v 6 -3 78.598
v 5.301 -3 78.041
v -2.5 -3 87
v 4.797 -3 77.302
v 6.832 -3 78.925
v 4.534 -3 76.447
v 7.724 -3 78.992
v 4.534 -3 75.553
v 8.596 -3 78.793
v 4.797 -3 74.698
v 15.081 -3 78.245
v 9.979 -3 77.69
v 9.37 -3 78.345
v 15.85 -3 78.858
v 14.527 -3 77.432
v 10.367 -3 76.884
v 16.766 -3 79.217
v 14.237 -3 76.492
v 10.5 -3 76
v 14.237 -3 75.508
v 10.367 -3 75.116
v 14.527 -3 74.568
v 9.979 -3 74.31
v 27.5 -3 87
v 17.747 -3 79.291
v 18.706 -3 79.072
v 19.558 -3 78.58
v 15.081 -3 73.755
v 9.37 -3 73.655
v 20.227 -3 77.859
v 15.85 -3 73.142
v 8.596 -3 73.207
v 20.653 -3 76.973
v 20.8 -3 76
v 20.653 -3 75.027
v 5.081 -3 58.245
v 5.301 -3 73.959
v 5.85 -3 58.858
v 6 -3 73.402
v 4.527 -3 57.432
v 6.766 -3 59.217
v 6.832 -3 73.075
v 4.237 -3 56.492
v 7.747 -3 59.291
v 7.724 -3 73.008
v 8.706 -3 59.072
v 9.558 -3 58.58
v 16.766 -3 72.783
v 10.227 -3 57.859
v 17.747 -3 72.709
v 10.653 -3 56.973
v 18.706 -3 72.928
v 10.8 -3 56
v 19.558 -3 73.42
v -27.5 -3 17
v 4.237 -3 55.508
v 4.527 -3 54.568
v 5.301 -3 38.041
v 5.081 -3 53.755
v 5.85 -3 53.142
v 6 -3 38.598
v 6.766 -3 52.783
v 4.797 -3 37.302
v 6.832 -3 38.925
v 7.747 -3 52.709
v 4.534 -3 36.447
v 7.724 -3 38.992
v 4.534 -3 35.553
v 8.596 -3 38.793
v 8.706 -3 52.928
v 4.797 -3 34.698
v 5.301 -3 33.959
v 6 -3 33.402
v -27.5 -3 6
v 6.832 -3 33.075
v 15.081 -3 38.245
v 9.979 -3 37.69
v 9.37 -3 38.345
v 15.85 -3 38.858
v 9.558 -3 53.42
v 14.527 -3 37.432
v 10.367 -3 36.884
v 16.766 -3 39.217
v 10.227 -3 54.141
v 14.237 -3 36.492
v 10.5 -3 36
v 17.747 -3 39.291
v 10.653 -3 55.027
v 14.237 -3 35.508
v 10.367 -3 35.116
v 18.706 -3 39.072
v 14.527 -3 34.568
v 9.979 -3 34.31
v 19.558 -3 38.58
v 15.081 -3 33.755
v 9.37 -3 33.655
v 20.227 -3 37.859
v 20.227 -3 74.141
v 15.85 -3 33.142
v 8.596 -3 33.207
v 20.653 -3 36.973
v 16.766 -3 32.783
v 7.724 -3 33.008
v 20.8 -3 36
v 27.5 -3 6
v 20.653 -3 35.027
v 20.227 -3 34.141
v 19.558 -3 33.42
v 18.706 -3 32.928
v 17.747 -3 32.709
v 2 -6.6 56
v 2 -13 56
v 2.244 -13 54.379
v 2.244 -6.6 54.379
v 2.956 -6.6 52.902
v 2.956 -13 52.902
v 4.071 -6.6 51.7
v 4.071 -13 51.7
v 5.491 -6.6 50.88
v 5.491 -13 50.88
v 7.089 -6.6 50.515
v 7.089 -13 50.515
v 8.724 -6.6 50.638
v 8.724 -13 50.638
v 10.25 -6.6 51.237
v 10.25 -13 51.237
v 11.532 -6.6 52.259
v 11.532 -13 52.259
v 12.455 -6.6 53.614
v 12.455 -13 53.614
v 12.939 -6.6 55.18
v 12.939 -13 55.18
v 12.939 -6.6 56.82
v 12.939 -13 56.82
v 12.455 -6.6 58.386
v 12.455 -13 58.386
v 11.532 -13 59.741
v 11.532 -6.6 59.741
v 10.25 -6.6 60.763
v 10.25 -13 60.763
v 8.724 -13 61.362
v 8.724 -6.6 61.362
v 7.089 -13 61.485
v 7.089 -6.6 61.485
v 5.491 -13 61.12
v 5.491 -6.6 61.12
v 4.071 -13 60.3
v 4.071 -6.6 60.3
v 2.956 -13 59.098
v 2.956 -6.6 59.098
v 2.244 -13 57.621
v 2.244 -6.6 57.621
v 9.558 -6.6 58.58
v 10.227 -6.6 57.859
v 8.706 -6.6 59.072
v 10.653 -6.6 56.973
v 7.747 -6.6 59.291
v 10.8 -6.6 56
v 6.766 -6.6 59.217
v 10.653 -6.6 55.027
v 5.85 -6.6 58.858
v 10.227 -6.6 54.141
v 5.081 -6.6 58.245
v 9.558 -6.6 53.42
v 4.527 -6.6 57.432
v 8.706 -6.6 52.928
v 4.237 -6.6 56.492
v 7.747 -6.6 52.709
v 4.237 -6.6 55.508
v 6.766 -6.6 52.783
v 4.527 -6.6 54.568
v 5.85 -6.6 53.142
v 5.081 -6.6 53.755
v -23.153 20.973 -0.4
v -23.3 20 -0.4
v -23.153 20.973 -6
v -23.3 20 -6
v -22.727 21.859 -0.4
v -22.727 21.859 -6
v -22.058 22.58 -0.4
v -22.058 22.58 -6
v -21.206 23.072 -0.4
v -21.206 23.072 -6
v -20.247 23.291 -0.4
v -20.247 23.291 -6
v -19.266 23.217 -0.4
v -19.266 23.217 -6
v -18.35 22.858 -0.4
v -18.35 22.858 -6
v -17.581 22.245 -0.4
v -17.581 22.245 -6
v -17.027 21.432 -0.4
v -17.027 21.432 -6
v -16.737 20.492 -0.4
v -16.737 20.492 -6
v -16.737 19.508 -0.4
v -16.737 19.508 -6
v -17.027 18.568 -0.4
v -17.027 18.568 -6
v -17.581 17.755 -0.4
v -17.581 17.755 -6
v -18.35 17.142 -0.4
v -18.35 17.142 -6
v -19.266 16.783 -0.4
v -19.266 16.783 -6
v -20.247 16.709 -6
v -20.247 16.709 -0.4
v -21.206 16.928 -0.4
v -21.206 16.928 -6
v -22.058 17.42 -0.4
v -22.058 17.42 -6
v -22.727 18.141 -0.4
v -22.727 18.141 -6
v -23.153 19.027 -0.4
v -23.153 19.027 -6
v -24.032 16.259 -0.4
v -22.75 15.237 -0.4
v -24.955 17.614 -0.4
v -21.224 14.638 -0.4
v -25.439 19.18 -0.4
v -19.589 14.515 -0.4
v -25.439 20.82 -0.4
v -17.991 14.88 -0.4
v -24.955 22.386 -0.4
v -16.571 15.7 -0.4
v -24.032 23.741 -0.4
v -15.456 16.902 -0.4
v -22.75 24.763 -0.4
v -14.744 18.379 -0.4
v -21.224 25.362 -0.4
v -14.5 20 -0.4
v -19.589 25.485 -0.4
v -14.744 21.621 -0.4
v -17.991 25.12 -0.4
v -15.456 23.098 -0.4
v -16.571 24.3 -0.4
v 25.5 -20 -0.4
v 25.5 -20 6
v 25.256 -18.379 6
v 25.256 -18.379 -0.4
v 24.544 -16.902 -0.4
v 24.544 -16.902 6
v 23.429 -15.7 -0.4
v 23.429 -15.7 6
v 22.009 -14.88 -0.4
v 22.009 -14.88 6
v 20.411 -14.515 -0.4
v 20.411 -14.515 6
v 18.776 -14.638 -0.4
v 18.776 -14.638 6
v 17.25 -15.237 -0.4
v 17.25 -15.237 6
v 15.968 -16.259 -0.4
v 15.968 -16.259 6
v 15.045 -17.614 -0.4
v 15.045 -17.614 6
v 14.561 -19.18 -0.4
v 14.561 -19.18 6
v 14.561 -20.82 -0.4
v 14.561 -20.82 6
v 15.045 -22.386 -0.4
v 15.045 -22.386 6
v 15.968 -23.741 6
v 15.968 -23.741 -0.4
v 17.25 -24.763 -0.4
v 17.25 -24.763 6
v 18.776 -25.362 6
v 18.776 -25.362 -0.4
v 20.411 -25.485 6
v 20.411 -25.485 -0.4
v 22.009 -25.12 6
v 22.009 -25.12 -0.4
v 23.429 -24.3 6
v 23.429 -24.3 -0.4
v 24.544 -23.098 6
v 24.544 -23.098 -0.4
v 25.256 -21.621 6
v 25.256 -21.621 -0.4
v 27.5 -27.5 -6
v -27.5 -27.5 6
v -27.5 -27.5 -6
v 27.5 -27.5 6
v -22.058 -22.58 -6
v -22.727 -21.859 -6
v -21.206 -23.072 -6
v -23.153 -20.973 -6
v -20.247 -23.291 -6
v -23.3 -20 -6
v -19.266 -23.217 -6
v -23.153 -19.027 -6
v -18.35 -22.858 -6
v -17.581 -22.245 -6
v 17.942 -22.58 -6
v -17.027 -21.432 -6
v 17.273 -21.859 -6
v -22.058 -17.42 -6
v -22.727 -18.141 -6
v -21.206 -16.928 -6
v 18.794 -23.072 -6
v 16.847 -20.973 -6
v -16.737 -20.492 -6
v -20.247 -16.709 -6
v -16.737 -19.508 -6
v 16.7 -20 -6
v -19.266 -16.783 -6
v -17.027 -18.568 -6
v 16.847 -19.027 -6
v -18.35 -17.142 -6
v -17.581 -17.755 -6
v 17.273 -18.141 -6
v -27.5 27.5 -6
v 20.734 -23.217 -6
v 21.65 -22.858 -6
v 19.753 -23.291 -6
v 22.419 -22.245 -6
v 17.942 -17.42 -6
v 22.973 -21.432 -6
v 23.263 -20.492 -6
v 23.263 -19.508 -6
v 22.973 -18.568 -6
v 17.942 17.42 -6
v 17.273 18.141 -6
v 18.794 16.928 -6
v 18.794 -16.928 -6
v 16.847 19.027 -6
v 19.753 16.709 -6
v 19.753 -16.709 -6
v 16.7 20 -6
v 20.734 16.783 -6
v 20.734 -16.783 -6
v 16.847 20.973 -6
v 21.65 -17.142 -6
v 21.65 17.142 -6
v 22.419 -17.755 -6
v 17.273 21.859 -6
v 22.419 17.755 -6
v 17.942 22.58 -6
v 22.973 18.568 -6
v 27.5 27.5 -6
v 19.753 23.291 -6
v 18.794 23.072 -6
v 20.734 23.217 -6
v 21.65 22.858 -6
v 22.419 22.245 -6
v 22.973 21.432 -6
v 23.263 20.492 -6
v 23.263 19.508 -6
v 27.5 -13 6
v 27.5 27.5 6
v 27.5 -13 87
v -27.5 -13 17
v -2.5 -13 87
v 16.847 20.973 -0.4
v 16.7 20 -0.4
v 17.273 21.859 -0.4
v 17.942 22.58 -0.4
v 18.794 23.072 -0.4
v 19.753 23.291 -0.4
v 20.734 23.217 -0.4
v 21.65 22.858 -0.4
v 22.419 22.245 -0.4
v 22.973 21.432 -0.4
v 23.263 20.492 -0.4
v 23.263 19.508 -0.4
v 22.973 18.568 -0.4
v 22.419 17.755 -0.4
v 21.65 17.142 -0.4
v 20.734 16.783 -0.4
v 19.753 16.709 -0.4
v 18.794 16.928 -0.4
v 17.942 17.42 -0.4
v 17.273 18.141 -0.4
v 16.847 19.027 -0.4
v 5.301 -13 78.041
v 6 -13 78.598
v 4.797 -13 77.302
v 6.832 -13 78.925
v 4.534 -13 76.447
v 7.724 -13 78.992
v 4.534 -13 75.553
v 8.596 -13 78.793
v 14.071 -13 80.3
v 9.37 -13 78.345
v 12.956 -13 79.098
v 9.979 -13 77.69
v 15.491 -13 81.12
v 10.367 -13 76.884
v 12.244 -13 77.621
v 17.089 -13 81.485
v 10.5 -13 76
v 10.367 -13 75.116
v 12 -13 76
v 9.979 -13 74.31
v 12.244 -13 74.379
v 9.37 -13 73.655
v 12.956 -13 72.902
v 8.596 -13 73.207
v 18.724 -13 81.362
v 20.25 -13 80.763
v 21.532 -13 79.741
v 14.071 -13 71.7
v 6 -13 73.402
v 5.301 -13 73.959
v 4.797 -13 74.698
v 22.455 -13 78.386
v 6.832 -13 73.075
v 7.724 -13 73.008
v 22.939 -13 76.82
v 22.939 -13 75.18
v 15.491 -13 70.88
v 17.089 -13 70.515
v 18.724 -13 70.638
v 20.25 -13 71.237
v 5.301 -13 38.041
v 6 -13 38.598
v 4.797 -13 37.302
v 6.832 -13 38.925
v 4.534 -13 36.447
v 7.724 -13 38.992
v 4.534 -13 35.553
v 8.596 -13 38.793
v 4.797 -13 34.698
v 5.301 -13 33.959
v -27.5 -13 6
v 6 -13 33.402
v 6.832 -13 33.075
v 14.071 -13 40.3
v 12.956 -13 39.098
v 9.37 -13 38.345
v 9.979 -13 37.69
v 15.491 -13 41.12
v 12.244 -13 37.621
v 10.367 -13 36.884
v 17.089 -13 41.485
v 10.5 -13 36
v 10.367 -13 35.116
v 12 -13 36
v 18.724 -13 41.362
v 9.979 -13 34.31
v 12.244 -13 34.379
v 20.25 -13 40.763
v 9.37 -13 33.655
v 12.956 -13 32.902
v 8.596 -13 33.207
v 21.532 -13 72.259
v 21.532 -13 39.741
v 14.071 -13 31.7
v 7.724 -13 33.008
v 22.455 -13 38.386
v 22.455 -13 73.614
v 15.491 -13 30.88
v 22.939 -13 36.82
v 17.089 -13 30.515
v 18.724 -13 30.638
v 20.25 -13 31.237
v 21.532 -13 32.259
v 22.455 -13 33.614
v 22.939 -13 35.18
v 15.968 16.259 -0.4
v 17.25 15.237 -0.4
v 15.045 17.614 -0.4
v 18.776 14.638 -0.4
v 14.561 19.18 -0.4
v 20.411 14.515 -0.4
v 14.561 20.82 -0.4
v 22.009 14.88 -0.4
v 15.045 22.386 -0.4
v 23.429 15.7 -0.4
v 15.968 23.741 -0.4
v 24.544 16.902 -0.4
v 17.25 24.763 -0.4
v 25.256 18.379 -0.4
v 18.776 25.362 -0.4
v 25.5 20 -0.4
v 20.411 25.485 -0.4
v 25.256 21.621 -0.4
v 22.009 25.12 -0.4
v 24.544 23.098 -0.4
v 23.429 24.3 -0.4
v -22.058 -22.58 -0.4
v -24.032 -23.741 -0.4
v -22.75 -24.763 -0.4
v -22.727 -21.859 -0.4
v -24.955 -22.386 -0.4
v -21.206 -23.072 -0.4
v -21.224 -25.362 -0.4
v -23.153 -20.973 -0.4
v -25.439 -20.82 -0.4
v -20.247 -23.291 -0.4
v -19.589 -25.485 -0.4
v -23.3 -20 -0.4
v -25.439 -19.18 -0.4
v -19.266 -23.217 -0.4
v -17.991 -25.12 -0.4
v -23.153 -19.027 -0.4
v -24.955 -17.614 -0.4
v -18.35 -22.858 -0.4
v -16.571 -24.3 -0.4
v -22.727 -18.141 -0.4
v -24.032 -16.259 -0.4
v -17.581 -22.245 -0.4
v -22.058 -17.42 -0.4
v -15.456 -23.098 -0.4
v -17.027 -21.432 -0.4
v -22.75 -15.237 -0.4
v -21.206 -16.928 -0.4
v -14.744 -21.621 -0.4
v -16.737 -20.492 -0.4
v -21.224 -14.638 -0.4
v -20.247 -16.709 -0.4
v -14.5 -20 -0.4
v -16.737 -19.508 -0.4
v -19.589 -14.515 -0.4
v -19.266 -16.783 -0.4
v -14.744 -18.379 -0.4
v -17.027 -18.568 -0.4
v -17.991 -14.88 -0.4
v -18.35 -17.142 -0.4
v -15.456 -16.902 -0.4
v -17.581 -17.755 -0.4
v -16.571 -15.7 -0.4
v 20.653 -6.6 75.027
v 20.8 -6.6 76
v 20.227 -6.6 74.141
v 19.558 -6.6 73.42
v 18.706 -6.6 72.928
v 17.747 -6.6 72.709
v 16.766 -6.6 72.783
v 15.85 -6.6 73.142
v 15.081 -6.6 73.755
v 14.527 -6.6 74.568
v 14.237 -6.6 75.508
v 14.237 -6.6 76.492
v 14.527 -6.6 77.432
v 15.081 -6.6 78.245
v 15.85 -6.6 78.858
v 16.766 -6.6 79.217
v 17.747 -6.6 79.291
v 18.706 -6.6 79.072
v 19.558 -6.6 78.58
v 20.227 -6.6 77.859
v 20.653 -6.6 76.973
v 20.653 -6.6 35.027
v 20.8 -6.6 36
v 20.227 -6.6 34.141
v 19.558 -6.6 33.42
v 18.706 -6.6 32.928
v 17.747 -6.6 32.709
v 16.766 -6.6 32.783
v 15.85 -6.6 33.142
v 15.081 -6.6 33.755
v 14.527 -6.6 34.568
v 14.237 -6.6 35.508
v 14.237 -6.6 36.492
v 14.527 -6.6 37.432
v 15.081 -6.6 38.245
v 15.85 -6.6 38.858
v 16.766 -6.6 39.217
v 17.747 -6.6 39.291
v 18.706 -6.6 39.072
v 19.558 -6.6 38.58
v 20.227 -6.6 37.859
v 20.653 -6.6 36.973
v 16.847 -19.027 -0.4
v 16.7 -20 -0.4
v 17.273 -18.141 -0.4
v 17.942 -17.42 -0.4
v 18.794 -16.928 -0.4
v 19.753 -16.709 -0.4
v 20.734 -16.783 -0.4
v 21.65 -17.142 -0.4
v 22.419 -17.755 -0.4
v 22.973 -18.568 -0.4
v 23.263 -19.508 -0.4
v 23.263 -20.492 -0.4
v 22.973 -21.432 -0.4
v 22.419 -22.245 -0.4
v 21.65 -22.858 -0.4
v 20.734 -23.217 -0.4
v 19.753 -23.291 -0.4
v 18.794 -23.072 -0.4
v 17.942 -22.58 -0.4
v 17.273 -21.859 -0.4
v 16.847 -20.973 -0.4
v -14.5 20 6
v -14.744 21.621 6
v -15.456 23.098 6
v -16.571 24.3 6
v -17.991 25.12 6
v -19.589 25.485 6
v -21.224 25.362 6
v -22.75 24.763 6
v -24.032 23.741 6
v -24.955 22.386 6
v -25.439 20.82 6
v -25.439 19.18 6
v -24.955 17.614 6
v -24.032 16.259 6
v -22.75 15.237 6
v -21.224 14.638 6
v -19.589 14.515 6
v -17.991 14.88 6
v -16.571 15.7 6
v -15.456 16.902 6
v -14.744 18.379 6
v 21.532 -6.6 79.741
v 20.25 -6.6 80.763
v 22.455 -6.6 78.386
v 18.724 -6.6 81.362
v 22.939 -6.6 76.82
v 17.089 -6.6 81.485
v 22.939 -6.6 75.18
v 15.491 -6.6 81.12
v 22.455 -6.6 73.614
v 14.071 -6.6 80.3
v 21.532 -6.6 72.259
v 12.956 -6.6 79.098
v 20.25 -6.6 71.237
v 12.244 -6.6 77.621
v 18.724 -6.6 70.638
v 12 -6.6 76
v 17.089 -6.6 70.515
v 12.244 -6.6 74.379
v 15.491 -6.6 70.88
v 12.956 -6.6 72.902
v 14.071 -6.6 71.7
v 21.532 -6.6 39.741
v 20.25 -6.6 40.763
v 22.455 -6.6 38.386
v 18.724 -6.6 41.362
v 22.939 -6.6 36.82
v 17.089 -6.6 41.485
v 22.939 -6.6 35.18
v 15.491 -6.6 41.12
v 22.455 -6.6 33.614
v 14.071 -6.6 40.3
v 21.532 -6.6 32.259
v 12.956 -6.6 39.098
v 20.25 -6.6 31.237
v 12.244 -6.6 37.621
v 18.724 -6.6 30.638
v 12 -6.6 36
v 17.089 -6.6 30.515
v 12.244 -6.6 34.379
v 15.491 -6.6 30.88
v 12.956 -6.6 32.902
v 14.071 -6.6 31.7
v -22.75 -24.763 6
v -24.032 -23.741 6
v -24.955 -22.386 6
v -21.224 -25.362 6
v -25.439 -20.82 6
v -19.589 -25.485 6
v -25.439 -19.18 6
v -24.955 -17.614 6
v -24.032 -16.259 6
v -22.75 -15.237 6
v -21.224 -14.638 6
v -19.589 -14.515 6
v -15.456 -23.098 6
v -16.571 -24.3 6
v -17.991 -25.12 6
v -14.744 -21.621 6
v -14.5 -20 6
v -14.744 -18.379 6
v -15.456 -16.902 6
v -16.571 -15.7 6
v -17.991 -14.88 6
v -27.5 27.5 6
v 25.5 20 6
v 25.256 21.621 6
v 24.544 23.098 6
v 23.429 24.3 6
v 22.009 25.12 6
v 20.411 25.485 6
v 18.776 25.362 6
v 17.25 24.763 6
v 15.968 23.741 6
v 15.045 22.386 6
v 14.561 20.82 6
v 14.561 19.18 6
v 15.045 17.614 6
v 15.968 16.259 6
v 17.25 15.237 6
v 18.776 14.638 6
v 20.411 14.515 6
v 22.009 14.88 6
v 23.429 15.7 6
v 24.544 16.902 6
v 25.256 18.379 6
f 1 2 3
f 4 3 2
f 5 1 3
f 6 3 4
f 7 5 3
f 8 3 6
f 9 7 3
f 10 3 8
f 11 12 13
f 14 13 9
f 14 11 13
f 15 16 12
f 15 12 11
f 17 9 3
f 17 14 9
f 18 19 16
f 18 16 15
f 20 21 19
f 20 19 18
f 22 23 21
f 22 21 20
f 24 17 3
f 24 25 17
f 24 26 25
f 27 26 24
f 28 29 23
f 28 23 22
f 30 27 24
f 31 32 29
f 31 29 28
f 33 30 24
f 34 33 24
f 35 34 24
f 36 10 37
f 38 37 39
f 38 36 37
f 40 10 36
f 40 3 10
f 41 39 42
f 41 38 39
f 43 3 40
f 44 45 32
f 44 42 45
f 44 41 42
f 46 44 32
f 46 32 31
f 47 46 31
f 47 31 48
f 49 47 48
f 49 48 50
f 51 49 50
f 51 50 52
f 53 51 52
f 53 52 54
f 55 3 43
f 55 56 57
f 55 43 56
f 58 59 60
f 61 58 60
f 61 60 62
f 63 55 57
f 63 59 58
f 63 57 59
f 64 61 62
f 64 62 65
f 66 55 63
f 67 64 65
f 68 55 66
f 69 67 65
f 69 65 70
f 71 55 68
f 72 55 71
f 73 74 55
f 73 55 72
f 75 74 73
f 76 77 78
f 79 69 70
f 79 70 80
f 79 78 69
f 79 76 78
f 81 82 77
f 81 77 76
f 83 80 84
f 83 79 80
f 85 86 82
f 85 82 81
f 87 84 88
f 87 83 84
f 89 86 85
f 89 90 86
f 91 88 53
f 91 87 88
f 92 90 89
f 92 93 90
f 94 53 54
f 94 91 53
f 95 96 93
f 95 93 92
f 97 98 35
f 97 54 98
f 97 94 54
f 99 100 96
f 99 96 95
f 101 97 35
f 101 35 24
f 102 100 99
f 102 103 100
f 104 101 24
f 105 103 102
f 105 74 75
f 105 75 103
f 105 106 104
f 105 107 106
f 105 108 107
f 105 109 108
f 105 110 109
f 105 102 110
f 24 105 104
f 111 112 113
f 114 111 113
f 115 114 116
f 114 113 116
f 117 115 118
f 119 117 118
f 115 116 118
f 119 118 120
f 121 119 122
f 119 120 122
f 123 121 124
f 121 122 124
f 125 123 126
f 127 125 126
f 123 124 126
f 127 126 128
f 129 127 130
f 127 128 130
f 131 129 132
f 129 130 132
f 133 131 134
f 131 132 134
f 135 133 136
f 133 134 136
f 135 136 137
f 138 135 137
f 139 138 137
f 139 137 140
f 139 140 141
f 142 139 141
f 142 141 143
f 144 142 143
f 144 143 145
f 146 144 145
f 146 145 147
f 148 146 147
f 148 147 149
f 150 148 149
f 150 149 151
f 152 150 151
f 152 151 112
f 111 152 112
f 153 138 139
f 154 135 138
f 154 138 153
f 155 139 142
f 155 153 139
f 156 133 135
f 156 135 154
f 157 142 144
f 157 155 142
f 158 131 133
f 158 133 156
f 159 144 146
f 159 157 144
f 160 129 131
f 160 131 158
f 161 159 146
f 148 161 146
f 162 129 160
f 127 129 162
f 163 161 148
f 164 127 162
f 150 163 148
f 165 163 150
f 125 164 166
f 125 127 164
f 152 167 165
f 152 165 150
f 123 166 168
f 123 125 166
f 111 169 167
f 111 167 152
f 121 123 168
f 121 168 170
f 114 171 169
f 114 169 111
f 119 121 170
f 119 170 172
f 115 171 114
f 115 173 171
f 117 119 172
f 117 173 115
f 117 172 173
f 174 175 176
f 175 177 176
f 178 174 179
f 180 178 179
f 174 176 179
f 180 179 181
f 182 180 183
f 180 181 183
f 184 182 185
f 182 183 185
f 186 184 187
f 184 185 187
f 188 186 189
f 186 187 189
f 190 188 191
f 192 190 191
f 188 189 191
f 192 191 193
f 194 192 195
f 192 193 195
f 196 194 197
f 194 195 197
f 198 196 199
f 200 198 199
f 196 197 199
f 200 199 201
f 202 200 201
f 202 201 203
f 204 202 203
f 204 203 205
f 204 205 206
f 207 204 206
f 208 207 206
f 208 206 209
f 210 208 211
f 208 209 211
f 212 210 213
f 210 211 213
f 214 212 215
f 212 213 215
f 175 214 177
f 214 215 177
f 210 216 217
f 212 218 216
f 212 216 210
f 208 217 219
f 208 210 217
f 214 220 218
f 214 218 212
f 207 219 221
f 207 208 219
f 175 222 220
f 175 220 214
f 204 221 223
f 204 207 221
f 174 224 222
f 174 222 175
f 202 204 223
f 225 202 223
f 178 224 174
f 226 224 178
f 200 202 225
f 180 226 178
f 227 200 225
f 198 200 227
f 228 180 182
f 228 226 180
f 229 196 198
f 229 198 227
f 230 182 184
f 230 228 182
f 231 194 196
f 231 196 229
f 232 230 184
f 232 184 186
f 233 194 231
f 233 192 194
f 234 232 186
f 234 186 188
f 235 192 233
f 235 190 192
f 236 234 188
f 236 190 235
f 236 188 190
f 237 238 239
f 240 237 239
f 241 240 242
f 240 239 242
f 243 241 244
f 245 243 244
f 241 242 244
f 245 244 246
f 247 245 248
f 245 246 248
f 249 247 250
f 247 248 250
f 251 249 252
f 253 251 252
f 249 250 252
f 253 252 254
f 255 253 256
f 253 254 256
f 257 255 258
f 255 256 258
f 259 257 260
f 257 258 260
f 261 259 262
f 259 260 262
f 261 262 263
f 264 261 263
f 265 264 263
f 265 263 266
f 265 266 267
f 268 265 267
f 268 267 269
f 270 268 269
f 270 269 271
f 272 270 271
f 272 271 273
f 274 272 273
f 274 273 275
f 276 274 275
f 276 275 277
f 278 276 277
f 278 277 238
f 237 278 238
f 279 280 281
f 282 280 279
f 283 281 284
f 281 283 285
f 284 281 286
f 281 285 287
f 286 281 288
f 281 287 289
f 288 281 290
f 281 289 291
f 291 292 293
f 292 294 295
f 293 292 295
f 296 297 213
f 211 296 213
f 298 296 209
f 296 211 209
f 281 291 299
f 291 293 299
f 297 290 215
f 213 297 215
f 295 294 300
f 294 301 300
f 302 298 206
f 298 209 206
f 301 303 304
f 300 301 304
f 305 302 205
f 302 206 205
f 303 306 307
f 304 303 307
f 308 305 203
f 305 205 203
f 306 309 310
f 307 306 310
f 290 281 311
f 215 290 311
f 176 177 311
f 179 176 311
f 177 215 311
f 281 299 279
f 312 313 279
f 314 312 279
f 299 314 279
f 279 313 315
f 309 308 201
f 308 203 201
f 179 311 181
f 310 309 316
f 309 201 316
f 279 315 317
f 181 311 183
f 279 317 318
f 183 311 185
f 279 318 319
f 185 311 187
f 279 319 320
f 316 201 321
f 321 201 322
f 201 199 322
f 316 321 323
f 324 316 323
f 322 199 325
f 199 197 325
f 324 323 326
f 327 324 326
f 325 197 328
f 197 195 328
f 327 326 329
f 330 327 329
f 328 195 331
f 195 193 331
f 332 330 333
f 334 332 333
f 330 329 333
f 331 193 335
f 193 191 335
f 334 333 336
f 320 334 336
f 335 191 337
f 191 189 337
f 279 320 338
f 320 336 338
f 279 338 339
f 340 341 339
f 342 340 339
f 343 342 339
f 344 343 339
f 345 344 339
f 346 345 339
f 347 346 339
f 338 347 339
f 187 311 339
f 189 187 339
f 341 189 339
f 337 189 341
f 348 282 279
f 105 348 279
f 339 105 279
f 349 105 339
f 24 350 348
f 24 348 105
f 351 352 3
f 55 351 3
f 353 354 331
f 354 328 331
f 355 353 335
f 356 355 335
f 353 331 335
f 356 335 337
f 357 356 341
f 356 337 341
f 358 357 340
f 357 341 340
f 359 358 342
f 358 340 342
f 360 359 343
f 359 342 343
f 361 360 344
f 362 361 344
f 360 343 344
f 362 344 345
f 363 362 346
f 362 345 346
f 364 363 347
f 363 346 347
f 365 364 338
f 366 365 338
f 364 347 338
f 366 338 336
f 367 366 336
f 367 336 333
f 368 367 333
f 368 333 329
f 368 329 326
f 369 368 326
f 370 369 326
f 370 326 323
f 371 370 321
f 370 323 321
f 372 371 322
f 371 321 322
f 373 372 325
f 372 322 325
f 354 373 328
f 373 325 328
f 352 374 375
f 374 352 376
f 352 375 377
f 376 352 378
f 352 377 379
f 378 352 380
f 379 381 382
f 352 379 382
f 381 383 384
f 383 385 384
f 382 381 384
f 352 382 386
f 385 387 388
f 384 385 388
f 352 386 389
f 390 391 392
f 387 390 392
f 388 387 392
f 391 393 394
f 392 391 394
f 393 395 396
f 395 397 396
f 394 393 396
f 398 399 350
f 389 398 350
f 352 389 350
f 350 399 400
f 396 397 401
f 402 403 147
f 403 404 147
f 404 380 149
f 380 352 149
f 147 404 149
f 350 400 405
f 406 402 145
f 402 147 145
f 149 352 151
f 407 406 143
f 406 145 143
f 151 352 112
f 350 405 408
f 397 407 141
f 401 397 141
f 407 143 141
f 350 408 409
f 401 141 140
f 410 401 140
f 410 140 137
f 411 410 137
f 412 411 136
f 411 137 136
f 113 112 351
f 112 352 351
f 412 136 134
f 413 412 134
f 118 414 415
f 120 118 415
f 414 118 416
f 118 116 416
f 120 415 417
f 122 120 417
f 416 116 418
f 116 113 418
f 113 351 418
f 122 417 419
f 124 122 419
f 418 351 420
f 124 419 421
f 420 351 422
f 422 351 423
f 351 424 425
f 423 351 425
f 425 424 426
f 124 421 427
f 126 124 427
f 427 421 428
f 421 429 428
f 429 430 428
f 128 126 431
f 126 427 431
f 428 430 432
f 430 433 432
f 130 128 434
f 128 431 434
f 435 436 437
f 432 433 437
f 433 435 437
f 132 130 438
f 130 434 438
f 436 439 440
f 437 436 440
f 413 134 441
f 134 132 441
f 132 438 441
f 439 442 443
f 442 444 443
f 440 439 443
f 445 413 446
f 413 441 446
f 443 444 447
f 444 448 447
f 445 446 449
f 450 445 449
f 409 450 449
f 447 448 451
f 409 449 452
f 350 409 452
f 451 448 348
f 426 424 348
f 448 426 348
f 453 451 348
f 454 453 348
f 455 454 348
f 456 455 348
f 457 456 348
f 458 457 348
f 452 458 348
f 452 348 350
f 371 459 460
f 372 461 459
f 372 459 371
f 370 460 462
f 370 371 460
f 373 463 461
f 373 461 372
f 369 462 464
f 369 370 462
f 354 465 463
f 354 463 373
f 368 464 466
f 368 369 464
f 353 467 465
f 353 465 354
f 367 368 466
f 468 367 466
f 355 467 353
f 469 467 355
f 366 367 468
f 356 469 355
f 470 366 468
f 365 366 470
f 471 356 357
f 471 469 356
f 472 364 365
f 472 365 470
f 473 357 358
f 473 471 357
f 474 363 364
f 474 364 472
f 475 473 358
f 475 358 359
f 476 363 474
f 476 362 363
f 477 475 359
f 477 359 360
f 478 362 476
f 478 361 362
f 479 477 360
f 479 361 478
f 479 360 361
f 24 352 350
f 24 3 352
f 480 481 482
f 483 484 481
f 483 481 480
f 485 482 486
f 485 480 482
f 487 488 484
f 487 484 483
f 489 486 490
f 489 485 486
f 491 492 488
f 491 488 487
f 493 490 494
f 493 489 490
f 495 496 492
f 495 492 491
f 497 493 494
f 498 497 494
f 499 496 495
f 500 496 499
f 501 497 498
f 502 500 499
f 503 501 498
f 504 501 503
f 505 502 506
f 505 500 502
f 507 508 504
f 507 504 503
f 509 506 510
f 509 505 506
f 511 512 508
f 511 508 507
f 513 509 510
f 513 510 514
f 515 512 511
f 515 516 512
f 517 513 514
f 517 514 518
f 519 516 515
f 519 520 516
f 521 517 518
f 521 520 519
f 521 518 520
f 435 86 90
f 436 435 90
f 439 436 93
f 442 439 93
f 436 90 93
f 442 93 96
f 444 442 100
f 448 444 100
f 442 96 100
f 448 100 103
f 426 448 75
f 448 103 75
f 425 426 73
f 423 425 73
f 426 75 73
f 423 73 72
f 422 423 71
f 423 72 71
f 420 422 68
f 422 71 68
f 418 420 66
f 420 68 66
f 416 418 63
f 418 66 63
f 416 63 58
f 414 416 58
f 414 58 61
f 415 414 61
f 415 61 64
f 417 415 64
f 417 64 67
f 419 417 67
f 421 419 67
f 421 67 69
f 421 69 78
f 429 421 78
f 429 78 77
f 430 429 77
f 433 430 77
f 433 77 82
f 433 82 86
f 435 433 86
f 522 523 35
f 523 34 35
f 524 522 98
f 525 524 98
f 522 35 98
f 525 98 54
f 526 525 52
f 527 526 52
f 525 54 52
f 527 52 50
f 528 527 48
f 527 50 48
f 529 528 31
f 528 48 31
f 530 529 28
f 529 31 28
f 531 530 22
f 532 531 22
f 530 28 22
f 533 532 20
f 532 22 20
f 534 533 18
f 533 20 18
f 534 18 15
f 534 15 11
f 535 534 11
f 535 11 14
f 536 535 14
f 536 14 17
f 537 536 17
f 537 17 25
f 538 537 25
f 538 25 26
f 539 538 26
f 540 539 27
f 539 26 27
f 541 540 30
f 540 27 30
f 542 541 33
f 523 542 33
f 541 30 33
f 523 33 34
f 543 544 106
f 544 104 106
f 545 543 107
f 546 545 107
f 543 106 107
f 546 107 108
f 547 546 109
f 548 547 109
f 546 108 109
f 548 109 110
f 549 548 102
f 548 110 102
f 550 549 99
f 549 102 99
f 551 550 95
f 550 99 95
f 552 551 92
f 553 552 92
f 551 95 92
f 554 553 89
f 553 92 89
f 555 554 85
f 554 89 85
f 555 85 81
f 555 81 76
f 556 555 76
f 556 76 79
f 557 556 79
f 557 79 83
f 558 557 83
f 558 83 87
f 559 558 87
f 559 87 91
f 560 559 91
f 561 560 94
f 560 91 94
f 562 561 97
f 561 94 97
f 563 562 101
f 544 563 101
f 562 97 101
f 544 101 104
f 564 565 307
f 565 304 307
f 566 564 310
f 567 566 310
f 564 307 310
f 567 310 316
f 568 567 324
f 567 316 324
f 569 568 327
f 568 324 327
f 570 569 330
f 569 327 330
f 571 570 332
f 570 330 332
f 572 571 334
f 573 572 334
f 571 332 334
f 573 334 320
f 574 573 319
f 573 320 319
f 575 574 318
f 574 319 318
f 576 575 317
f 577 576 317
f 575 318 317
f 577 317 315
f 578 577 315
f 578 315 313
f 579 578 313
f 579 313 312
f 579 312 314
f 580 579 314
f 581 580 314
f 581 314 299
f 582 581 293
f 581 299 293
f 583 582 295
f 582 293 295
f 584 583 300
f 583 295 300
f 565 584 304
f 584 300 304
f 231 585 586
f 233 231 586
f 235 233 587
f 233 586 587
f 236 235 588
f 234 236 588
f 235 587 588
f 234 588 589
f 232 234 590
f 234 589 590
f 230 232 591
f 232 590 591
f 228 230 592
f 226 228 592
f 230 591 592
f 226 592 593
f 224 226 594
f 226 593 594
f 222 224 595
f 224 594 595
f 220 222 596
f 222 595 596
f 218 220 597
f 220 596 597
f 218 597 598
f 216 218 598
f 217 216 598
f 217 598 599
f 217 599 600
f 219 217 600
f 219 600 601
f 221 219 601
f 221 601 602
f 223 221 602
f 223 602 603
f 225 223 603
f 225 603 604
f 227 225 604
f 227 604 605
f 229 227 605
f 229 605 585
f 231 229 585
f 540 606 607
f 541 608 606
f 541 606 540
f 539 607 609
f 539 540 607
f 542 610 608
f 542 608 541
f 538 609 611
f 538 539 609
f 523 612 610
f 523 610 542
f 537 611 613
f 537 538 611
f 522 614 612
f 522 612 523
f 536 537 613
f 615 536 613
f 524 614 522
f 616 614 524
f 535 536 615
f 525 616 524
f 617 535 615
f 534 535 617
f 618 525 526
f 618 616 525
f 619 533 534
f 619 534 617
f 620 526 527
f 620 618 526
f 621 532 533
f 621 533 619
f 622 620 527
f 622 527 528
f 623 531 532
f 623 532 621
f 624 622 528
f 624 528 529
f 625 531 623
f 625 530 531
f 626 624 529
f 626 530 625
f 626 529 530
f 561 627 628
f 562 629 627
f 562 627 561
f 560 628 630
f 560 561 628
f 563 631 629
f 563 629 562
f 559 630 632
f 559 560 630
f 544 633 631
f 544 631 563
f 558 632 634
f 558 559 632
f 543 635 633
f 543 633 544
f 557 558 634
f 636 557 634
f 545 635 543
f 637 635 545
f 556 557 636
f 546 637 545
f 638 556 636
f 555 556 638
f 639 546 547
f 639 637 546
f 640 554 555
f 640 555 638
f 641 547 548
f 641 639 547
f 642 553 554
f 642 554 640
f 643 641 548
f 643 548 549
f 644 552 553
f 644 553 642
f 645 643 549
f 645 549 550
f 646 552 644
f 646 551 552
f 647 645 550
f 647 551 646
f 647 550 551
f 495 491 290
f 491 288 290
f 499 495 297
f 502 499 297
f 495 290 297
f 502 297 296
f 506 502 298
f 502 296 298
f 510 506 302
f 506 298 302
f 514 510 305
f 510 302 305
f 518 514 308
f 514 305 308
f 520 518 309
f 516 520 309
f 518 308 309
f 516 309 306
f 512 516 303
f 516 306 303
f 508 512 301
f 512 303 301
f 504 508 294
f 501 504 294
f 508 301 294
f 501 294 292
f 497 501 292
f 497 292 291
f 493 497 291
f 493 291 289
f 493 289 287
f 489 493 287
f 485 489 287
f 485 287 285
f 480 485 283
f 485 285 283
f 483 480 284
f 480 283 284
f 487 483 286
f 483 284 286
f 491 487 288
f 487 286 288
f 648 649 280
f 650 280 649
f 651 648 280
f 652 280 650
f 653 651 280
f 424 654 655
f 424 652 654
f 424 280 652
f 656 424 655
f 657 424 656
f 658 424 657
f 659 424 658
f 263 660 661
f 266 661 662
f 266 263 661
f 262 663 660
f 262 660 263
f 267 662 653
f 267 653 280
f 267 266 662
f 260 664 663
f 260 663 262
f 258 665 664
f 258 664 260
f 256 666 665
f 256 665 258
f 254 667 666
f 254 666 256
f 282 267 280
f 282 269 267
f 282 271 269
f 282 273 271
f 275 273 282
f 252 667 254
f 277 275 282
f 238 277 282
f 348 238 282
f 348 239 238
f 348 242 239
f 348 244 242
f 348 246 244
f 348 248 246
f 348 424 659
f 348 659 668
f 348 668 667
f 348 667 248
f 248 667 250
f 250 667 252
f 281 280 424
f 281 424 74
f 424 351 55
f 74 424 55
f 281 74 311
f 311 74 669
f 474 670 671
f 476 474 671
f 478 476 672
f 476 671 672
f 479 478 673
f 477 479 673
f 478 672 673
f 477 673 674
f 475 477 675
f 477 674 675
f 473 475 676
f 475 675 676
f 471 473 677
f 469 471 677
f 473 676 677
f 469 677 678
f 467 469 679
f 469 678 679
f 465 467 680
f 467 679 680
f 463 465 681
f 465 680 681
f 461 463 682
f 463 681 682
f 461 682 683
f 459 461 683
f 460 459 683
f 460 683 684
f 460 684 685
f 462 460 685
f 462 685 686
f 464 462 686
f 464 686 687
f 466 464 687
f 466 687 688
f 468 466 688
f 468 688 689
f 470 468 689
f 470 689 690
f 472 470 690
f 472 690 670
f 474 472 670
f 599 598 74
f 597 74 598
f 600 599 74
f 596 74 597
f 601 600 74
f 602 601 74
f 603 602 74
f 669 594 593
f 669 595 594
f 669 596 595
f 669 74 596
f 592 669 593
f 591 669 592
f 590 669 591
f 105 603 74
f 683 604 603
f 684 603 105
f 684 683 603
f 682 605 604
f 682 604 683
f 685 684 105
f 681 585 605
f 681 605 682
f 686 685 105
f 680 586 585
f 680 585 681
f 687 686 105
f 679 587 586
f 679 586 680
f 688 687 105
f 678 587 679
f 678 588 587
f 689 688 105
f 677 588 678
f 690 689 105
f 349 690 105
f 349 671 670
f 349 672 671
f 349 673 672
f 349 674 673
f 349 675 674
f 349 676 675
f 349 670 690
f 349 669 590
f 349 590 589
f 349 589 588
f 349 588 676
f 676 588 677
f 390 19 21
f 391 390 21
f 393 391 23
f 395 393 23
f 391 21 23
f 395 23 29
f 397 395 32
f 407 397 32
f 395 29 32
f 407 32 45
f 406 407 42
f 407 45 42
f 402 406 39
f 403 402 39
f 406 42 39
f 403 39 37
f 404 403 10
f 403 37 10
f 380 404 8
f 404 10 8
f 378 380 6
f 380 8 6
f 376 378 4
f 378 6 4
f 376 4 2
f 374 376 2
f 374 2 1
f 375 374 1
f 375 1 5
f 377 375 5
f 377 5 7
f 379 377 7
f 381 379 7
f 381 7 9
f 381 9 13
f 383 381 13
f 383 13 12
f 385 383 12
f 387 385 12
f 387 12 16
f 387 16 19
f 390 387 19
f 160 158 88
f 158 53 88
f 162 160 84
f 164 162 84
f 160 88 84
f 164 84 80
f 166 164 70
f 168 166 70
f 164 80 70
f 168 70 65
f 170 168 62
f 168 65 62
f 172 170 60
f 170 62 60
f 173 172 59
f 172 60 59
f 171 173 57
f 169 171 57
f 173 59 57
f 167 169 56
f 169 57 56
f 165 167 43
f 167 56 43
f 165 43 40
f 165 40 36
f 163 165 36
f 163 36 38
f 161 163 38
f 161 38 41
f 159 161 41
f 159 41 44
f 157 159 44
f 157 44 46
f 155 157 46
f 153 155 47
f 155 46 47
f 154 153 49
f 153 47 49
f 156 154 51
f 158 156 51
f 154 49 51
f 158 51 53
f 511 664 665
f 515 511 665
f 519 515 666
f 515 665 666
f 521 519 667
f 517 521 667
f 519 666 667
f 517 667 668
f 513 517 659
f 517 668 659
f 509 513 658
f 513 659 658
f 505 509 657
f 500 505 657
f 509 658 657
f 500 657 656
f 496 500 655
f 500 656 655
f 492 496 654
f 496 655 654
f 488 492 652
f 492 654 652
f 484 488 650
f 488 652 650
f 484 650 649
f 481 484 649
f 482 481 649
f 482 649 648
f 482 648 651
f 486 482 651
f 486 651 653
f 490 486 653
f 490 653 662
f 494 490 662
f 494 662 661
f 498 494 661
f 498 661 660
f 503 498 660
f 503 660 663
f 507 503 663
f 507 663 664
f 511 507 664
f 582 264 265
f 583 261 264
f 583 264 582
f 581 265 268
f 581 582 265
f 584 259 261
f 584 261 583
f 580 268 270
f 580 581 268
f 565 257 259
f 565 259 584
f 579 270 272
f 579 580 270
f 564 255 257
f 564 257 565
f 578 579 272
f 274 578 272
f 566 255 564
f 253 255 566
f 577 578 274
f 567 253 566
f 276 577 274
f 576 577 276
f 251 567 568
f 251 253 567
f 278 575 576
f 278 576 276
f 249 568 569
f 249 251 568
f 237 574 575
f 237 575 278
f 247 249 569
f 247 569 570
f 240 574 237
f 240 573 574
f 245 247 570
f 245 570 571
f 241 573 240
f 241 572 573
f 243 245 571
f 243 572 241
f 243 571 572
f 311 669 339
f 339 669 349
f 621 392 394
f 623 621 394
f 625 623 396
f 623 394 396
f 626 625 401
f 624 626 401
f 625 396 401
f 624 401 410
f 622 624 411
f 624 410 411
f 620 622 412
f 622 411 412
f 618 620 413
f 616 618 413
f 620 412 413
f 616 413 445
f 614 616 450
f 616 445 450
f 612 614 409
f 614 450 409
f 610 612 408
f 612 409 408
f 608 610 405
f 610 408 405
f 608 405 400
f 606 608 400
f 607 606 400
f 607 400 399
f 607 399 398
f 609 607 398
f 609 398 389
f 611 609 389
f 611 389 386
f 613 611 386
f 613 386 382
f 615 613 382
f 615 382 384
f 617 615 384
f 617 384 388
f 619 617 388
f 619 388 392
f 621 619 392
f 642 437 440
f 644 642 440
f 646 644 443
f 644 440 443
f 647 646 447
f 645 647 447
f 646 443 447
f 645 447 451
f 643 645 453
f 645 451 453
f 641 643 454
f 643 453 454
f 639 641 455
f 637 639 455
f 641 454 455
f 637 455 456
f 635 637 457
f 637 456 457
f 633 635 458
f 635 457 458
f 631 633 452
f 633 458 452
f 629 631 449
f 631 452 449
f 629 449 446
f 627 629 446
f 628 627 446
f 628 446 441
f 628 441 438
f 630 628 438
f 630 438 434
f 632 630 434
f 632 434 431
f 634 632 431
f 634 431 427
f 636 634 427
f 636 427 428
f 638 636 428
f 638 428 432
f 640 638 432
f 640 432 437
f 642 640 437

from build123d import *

# Parameters (mm, degrees)
SKETCH1_W                                           = 55
SKETCH1_H                                           = 55
BOSS_EXTRUDE1_DEPTH                                 = 6
CBORE_FOR_M6_HEX_SOCKET_HEAD_CAP_SCREW1_D           = 6.6
CBORE_FOR_M6_HEX_SOCKET_HEAD_CAP_SCREW1_CBORE_D     = 11
CBORE_FOR_M6_HEX_SOCKET_HEAD_CAP_SCREW1_CBORE_DEPTH = 6.4
SKETCH4_W                                           = 55
SKETCH4_H                                           = 10
BOSS_EXTRUDE2_DEPTH                                 = 81
CBORE_FOR_M6_HEX_SOCKET_HEAD_CAP_SCREW2_D           = 6.6
CBORE_FOR_M6_HEX_SOCKET_HEAD_CAP_SCREW2_CBORE_D     = 11
CBORE_FOR_M6_HEX_SOCKET_HEAD_CAP_SCREW2_CBORE_DEPTH = 6.4
CHAMFER1_SIZE                                       = 70
CHAMFER1_SIZE2                                      = 25
F_6_0MM_DOWEL_HOLE1_D                               = 6


with BuildPart() as part:
    # Sketch1 → Boss-Extrude1 (new, symmetric)
    with BuildSketch(Plane.XY):
        Rectangle(SKETCH1_W, SKETCH1_H)
    extrude(amount=BOSS_EXTRUDE1_DEPTH, both=True)

    # CBORE for M6 Hex Socket Head Cap Screw1 (through all)
    with Locations(Plane.XY.offset(6)):
        with Locations((-20, 20), (20, 20), (20, -20), (-20, -20)):
            CounterBoreHole(CBORE_FOR_M6_HEX_SOCKET_HEAD_CAP_SCREW1_D / 2, CBORE_FOR_M6_HEX_SOCKET_HEAD_CAP_SCREW1_CBORE_D / 2, CBORE_FOR_M6_HEX_SOCKET_HEAD_CAP_SCREW1_CBORE_DEPTH)

    # Sketch4 → Boss-Extrude2 (add)
    with BuildSketch(Plane.XY.offset(6)):
        with Locations((0, -8)):
            Rectangle(SKETCH4_W, SKETCH4_H)
    extrude(amount=BOSS_EXTRUDE2_DEPTH)

    # CBORE for M6 Hex Socket Head Cap Screw2 (through all)
    with Locations(Plane(origin=(0, -13, 0), x_dir=(-1, 0, 0), z_dir=(0, -1, 0))):
        with Locations((-17.5, -76), (-7.5, -56), (-17.5, -36)):
            CounterBoreHole(CBORE_FOR_M6_HEX_SOCKET_HEAD_CAP_SCREW2_D / 2, CBORE_FOR_M6_HEX_SOCKET_HEAD_CAP_SCREW2_CBORE_D / 2, CBORE_FOR_M6_HEX_SOCKET_HEAD_CAP_SCREW2_CBORE_DEPTH)

    # Chamfer1
    chamfer1_edges = [part.edges().sort_by_distance(p)[0] for p in [
        (-27.5, -8, 87),
    ]]
    chamfer1_side = [part.faces().sort_by_distance(p)[0] for p in [
        (-27.5, -4.408163265, 25.62244898),
    ]]
    chamfer(chamfer1_edges, length=CHAMFER1_SIZE, length2=CHAMFER1_SIZE2, reference=chamfer1_side[0])

    # Ø6.0mm Dowel Hole1 (through all)
    with Locations(Plane(origin=(0, -13, 0), x_dir=(-1, 0, 0), z_dir=(0, -1, 0))):
        with Locations((-7.5, -36), (-7.5, -76)):
            Hole(F_6_0MM_DOWEL_HOLE1_D / 2)


solid = part.part
